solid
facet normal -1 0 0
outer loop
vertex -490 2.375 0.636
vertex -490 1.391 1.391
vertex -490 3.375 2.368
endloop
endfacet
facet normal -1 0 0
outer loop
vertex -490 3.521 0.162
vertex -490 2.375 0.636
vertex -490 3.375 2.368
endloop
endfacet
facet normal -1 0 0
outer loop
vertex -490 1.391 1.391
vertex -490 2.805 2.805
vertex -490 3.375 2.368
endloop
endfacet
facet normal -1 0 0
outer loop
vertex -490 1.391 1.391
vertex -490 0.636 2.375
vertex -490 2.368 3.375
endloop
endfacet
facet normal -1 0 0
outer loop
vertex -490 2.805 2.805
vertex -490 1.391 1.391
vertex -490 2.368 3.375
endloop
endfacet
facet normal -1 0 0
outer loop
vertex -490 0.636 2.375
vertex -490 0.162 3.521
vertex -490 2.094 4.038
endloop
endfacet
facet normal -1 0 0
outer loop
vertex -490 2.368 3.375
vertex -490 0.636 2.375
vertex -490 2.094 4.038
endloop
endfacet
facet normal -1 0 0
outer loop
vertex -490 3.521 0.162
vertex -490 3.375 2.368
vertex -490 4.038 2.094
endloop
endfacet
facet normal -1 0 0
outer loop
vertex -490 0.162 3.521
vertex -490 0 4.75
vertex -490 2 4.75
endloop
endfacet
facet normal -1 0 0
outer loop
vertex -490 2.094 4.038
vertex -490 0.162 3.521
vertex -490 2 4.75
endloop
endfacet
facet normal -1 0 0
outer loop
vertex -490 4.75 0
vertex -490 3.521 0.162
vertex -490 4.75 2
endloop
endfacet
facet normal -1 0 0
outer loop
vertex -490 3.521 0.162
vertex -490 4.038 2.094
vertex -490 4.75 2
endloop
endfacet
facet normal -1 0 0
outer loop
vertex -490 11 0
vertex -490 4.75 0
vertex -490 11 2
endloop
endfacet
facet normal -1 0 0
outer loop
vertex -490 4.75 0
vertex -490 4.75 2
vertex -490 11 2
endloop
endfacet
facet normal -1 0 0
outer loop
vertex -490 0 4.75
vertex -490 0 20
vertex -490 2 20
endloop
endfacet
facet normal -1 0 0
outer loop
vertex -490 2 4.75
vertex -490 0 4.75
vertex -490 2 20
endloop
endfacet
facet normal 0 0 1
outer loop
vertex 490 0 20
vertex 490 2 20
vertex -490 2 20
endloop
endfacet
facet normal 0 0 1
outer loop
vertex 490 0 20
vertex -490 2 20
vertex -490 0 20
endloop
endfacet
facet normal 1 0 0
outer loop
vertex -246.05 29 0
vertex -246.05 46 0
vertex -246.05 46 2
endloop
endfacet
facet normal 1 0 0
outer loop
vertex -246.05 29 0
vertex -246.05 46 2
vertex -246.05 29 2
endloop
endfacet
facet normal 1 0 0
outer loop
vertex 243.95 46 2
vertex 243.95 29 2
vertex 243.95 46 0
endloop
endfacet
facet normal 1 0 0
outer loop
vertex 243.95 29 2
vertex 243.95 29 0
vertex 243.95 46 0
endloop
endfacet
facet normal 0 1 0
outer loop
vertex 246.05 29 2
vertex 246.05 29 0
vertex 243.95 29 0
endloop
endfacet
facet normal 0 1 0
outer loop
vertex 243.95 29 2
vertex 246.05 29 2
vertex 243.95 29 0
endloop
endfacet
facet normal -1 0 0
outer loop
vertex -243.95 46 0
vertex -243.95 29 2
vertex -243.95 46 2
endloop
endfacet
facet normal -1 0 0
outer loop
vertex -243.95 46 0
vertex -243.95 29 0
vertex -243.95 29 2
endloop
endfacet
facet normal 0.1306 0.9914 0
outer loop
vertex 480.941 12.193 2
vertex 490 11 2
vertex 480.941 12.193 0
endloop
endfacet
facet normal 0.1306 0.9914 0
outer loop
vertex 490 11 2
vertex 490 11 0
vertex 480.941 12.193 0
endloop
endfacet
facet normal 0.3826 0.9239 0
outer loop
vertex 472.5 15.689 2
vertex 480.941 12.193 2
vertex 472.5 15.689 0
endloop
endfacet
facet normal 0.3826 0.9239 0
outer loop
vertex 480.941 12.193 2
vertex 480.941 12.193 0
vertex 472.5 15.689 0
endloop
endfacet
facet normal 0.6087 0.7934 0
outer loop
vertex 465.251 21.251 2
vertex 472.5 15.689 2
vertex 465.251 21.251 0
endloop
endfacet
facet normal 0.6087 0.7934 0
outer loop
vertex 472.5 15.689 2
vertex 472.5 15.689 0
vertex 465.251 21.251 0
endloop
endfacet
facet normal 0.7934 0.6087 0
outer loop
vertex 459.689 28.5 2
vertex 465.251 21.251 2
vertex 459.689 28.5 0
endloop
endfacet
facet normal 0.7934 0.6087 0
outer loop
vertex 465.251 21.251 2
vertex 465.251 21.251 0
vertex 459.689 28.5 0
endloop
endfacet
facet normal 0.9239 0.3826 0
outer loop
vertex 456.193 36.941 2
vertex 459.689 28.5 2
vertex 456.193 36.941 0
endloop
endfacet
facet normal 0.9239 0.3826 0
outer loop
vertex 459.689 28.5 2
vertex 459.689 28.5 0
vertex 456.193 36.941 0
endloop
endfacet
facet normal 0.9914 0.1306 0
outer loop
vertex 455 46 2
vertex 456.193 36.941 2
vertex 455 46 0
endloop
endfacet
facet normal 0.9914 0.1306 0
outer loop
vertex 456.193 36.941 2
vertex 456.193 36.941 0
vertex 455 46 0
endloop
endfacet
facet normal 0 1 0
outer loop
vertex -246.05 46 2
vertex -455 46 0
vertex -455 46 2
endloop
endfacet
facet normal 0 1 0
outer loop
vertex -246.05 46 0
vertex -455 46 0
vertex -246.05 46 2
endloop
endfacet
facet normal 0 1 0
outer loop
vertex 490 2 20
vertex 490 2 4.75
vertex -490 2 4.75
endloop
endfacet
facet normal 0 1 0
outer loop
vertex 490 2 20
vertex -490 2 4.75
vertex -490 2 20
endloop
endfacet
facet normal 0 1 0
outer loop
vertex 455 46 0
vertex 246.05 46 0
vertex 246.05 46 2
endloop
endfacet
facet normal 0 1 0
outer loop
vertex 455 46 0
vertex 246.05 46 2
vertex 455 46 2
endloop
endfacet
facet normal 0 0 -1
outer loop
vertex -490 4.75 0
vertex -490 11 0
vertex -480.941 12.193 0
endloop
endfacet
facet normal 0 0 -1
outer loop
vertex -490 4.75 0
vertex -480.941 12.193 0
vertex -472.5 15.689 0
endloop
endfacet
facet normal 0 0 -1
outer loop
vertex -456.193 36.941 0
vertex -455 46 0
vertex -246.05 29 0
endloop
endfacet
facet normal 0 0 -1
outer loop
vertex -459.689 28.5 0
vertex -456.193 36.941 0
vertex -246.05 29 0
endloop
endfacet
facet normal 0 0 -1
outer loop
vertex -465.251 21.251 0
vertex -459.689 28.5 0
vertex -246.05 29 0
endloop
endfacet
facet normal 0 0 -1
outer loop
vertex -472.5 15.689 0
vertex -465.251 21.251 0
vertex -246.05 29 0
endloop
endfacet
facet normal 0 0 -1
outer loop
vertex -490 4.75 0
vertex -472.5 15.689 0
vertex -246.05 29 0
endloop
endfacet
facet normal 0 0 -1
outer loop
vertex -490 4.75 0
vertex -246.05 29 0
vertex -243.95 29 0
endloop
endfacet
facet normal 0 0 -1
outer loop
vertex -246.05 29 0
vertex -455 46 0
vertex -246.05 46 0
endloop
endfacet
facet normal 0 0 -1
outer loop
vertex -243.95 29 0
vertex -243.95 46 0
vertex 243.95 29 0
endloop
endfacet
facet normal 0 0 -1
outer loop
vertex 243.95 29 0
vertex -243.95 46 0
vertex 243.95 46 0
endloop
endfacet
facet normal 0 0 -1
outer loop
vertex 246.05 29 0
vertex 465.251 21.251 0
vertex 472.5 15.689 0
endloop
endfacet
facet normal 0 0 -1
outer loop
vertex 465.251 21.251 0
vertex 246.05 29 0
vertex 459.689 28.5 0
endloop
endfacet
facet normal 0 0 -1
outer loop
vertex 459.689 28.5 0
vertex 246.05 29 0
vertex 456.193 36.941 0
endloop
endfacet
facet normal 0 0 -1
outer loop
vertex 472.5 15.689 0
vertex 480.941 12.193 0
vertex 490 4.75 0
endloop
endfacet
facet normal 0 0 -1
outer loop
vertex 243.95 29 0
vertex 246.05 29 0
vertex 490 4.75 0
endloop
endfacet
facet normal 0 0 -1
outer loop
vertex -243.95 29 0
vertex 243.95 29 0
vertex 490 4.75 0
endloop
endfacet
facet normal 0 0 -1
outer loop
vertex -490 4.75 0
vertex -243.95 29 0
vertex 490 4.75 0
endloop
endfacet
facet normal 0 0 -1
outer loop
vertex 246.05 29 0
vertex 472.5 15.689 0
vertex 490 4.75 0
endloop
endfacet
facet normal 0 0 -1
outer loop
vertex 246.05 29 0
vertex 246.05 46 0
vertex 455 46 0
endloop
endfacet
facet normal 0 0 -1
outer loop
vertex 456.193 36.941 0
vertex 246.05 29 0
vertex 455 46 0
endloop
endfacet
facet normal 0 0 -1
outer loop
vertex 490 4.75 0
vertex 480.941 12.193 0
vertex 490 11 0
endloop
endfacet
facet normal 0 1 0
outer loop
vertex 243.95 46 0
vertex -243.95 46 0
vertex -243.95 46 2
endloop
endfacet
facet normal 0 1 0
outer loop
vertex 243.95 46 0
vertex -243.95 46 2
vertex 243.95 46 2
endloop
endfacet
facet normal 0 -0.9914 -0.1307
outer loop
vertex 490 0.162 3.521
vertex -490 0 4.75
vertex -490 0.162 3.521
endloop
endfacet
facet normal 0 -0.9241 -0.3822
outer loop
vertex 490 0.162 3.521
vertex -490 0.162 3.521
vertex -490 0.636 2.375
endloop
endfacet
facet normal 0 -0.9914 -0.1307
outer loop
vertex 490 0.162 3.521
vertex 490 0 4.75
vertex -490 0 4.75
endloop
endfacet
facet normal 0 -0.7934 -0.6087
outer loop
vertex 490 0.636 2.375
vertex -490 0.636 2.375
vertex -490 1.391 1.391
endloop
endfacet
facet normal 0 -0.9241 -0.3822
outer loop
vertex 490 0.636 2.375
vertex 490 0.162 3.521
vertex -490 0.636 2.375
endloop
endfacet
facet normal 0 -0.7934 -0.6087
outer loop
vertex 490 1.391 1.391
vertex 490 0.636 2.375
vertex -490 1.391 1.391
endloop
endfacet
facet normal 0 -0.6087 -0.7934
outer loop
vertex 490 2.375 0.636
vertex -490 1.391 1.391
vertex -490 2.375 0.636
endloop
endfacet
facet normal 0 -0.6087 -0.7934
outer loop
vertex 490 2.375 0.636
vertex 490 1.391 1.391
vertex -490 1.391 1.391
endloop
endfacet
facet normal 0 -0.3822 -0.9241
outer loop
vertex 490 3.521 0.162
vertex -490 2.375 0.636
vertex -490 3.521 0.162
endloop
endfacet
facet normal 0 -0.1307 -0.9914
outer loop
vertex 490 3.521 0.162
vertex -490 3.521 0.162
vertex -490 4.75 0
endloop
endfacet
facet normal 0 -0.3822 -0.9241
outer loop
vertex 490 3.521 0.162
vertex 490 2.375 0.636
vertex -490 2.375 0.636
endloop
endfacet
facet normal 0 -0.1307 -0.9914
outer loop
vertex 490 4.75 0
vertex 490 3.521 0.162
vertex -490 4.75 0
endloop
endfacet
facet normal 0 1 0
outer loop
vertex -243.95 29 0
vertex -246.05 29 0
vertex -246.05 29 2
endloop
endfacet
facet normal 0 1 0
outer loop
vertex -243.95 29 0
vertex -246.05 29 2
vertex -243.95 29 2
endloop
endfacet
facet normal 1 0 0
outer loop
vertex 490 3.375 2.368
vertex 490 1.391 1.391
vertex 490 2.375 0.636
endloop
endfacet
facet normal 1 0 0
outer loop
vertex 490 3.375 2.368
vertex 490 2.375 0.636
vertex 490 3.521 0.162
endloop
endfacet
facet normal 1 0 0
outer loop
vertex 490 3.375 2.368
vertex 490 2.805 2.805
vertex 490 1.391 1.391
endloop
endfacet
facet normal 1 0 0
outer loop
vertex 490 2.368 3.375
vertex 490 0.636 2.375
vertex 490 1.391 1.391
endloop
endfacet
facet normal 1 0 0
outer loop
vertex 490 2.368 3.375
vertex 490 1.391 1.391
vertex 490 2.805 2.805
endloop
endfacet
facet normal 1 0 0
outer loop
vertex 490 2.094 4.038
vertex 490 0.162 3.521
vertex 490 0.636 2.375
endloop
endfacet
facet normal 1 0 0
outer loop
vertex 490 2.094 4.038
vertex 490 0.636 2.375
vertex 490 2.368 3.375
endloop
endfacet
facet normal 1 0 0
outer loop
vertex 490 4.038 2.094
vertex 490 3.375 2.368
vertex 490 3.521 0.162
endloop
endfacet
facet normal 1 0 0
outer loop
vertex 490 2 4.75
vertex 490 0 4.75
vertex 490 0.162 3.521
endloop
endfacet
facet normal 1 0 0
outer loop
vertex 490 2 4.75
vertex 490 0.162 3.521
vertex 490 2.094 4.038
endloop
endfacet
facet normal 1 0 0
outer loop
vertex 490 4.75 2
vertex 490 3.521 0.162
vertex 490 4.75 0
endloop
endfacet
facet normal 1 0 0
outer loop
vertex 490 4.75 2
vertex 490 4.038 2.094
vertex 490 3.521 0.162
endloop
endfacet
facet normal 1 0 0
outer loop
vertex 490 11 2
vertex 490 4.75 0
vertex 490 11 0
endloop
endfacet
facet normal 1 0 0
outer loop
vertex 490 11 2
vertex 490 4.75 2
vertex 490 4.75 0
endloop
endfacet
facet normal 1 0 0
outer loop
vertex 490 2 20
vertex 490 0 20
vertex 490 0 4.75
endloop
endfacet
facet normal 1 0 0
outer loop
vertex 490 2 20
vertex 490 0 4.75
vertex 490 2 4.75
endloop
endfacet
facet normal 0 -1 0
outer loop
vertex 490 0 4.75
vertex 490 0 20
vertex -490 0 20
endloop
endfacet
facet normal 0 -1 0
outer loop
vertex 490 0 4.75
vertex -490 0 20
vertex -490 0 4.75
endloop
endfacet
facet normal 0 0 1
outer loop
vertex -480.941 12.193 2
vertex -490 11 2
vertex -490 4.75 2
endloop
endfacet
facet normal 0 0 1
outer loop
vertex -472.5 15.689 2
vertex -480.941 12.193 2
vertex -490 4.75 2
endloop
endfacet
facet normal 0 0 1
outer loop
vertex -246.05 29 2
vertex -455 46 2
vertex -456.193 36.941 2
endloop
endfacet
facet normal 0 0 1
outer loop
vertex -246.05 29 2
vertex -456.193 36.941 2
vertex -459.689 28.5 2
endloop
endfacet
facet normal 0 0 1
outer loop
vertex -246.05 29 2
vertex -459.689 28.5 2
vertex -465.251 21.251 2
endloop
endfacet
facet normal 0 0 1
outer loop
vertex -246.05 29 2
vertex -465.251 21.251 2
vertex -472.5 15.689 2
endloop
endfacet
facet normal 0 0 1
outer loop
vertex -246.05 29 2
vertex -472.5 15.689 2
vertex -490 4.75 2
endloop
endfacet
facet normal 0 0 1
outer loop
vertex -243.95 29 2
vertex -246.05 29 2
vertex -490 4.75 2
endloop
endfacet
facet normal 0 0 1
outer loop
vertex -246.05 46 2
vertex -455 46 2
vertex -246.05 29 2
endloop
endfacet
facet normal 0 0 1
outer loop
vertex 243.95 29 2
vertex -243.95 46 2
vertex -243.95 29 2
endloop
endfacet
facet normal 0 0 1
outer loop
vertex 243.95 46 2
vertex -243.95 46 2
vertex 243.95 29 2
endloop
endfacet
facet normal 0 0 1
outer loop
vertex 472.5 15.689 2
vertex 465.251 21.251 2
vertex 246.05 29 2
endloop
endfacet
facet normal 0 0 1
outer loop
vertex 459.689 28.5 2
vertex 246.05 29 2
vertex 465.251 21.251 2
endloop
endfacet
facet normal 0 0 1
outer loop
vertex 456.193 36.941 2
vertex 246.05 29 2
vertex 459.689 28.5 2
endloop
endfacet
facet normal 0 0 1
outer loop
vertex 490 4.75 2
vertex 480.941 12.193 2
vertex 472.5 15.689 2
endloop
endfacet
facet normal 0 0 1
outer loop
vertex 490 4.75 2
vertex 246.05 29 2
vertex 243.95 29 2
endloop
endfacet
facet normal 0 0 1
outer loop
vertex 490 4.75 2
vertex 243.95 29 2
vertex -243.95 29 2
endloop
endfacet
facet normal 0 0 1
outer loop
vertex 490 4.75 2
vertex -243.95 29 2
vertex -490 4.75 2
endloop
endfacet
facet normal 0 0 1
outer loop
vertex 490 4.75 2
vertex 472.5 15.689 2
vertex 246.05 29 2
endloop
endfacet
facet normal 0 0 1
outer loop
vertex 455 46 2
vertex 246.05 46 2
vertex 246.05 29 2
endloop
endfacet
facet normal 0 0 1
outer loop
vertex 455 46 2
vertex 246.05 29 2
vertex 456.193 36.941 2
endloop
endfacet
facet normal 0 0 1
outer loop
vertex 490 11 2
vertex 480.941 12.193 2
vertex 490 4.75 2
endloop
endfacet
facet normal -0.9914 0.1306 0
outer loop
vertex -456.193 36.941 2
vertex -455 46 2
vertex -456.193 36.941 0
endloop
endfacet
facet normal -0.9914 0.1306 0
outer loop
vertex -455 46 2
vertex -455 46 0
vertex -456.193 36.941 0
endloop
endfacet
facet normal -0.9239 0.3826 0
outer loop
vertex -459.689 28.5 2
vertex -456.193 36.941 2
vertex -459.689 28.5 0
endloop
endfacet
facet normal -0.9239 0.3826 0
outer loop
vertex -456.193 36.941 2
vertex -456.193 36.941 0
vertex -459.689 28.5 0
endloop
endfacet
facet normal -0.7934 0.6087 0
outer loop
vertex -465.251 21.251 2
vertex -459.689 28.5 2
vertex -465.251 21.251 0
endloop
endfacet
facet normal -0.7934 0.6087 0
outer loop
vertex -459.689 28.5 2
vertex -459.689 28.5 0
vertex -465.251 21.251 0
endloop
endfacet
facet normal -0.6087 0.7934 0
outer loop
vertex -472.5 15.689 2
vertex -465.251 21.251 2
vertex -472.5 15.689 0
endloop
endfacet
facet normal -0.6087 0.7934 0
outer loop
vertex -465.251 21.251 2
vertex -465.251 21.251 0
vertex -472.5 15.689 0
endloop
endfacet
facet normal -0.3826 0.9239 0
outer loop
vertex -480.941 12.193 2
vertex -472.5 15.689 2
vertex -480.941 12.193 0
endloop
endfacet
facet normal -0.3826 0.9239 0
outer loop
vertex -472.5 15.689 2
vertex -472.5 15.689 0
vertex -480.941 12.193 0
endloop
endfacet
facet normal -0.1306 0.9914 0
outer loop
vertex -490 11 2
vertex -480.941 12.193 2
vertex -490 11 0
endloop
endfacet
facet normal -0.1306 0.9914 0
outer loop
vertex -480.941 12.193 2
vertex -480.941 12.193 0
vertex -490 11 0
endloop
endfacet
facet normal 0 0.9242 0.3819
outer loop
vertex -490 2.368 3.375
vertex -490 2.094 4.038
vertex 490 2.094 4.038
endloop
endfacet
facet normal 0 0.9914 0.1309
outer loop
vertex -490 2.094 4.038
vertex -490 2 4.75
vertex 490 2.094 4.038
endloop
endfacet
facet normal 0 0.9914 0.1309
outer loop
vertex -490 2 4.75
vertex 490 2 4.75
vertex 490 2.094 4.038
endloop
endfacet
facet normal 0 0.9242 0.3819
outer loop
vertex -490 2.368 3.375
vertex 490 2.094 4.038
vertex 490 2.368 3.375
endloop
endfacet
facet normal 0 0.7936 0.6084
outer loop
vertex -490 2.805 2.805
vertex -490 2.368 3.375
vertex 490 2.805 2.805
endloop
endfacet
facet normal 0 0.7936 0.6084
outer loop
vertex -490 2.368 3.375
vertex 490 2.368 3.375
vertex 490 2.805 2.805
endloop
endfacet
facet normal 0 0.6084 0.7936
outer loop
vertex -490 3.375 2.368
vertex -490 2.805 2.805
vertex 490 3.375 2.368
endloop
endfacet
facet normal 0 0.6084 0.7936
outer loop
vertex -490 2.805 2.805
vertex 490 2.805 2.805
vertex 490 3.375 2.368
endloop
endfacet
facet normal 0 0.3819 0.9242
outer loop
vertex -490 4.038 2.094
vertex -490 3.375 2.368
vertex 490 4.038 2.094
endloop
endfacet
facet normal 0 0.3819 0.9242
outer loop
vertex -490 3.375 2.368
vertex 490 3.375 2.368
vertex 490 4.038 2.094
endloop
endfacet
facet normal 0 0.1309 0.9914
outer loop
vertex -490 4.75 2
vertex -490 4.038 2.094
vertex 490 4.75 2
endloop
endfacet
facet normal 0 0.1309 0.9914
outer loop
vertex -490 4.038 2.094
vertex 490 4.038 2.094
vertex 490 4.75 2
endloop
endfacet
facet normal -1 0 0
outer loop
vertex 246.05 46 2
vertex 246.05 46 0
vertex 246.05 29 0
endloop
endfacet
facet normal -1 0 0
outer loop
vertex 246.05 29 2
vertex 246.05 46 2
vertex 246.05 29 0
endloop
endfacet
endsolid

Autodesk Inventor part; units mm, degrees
ref_plane "YZ Plane" through (0, 0, 0) normal (1, 0, 0) x (0, 1, 0)
ref_plane "XZ Plane" through (0, 0, 0) normal (0, 1, 0) x (-1, 0, 0)
ref_plane "XY Plane" through (0, 0, 0) normal (0, 0, 1) x (1, 0, 0)
sketch "Sketch1" plane through (0, 0, 0) normal (0, 0, 1) x (1, 0, 0)
  line L0 (-490, 46) -> (490, 46)
  line L1 (490, 46) -> (490, 0)
  line L2 (490, 0) -> (-490, 0)
  line L3 (-490, 0) -> (-490, 46)
  point P0 (0, 0)
  point P1 (0, 0)
  dimension "d0" = 980
  dimension "d1" = 46
extrude "Plate1" add sketch "Sketch1" along normal blind 2
sketch "Sketch2" plane through (490, 2, 0) normal (0, -1, 0) x (1, 0, 0)
  line L0 (-980, 0) -> (0, 0)
  line L1 (0, 0) -> (0, 20)
  line L2 (0, 20) -> (-980, 20)
  line L3 (-980, 20) -> (-980, 0)
edge flange "Flange1" height 20 angle 90 thickness 2 bend radius 2.75 thickness toward (0, -1, 0) relief round relief width 2 relief depth 1 edges at (0, 0, 2) wall of the first edge with corners at (-490, 2, 0) (490, 2, 0) (490, 2, 20) (-490, 2, 20)
bend "Bend1"
corner "Corner1"
sketch "Sketch5" plane through (0, 0, 0) normal (0, 0, -1) x (-1, 0, 0)
  line L0 (490, 46) -> (-490, 46) projected
  line L1 (490, 0) -> (-490, 0) projected
  circle A0 centre (0, 46) radius 35
  line L2 (243.95, 46) -> (246.05, 46)
  line L3 (246.05, 46) -> (246.05, 29)
  line L4 (246.05, 29) -> (243.95, 29)
  line L5 (243.95, 29) -> (243.95, 46)
  line L6 (-243.95, 46) -> (-246.05, 46)
  line L7 (-246.05, 46) -> (-246.05, 29)
  line L8 (-246.05, 29) -> (-243.95, 29)
  line L9 (-243.95, 29) -> (-243.95, 46)
  line L10 (0, 46) -> (0, 0) construction
  line L11 (490, 0) -> (490, 46)
  line L12 (-490, 0) -> (-490, 46)
  circle A1 centre (-490, 46) radius 35
  circle A2 centre (490, 46) radius 35
  point P0 (0, 0)
  point P1 (245, 29)
  point P2 (-245, 29)
  point P3 (246.05, 46)
  point P4 (-35, 46)
  point P5 (35, 46)
  point P6 (-246.05, 46)
  point P7 (455, 46)
  point P8 (490, 11)
  point P9 (-490, 11)
  point P10 (-455, 46)
  dimension "d45" = 70
  dimension "d48" = 2.1
  dimension "d49" = 490
  dimension "d51" = 29
  dimension "d52" = 17
extrude "Extrusion1" cut sketch "Sketch5" against normal through all contours L3 L4 L5 L0 | L0 L11 A2 | L9 L8 L7 L0 | L12 L0 A1 picked at (473.6046, 29.6046) picked at (-466.9592, 43.4039)
sketch "Sketch9" plane through (0, 0, 2) normal (0, 0, 1) x (1, 0, 0)
  line L0 (448.2795, 24.3045) -> (448.2795, 12.3045) construction
  line L1 (448.2795, 12.3045) -> (248.2795, 12.3045) construction
  line L2 (248.2795, 12.3045) -> (248.2795, 24.3045) construction
  line L3 (248.2795, 24.3045) -> (448.2795, 24.3045) construction
  line L4 (-490, 46) -> (490, 46) projected
  point P0 (0, 0)
  point P1 (1.05, 68)
  point P2 (490, 46)
  point P3 (-490, 46)
  dimension "d40" = 200
  dimension "d41" = 12
mark "Mark2"
equation "\"d2\" = Thickness"
equation "\"d3\" = BendReliefWidth"
equation "\"d4\" = BendReliefDepth"
equation "\"d5\" = MinimumRemnant"
equation "\"d6\" = TransitionRadius"
equation "\"d9\" = BendRadius"
equation "\"d10\" = CornerReliefSize"
equation "\"d11\" = GapSize"
equation "\"d12\" = JacobiRadiusSize"
equation "\"BendReliefWidth\" = Thickness"
equation "\"BendReliefDepth\" = 0.5 * Thickness"
equation "\"CornerReliefSize\" = 4 * Thickness"
equation "\"MinimumRemnant\" = 2 * Thickness"
equation "\"TransitionRadius\" = BendRadius"
equation "\"JacobiRadiusSize\" = BendRadius"
equation "\"GapSize\" = Thickness"
equation "\"Thickness\" = 2"
equation "\"BendRadius\" = 2.75"
properties part number "MSC 307 stringer BOARD  ##" material "Stainless Steel"
